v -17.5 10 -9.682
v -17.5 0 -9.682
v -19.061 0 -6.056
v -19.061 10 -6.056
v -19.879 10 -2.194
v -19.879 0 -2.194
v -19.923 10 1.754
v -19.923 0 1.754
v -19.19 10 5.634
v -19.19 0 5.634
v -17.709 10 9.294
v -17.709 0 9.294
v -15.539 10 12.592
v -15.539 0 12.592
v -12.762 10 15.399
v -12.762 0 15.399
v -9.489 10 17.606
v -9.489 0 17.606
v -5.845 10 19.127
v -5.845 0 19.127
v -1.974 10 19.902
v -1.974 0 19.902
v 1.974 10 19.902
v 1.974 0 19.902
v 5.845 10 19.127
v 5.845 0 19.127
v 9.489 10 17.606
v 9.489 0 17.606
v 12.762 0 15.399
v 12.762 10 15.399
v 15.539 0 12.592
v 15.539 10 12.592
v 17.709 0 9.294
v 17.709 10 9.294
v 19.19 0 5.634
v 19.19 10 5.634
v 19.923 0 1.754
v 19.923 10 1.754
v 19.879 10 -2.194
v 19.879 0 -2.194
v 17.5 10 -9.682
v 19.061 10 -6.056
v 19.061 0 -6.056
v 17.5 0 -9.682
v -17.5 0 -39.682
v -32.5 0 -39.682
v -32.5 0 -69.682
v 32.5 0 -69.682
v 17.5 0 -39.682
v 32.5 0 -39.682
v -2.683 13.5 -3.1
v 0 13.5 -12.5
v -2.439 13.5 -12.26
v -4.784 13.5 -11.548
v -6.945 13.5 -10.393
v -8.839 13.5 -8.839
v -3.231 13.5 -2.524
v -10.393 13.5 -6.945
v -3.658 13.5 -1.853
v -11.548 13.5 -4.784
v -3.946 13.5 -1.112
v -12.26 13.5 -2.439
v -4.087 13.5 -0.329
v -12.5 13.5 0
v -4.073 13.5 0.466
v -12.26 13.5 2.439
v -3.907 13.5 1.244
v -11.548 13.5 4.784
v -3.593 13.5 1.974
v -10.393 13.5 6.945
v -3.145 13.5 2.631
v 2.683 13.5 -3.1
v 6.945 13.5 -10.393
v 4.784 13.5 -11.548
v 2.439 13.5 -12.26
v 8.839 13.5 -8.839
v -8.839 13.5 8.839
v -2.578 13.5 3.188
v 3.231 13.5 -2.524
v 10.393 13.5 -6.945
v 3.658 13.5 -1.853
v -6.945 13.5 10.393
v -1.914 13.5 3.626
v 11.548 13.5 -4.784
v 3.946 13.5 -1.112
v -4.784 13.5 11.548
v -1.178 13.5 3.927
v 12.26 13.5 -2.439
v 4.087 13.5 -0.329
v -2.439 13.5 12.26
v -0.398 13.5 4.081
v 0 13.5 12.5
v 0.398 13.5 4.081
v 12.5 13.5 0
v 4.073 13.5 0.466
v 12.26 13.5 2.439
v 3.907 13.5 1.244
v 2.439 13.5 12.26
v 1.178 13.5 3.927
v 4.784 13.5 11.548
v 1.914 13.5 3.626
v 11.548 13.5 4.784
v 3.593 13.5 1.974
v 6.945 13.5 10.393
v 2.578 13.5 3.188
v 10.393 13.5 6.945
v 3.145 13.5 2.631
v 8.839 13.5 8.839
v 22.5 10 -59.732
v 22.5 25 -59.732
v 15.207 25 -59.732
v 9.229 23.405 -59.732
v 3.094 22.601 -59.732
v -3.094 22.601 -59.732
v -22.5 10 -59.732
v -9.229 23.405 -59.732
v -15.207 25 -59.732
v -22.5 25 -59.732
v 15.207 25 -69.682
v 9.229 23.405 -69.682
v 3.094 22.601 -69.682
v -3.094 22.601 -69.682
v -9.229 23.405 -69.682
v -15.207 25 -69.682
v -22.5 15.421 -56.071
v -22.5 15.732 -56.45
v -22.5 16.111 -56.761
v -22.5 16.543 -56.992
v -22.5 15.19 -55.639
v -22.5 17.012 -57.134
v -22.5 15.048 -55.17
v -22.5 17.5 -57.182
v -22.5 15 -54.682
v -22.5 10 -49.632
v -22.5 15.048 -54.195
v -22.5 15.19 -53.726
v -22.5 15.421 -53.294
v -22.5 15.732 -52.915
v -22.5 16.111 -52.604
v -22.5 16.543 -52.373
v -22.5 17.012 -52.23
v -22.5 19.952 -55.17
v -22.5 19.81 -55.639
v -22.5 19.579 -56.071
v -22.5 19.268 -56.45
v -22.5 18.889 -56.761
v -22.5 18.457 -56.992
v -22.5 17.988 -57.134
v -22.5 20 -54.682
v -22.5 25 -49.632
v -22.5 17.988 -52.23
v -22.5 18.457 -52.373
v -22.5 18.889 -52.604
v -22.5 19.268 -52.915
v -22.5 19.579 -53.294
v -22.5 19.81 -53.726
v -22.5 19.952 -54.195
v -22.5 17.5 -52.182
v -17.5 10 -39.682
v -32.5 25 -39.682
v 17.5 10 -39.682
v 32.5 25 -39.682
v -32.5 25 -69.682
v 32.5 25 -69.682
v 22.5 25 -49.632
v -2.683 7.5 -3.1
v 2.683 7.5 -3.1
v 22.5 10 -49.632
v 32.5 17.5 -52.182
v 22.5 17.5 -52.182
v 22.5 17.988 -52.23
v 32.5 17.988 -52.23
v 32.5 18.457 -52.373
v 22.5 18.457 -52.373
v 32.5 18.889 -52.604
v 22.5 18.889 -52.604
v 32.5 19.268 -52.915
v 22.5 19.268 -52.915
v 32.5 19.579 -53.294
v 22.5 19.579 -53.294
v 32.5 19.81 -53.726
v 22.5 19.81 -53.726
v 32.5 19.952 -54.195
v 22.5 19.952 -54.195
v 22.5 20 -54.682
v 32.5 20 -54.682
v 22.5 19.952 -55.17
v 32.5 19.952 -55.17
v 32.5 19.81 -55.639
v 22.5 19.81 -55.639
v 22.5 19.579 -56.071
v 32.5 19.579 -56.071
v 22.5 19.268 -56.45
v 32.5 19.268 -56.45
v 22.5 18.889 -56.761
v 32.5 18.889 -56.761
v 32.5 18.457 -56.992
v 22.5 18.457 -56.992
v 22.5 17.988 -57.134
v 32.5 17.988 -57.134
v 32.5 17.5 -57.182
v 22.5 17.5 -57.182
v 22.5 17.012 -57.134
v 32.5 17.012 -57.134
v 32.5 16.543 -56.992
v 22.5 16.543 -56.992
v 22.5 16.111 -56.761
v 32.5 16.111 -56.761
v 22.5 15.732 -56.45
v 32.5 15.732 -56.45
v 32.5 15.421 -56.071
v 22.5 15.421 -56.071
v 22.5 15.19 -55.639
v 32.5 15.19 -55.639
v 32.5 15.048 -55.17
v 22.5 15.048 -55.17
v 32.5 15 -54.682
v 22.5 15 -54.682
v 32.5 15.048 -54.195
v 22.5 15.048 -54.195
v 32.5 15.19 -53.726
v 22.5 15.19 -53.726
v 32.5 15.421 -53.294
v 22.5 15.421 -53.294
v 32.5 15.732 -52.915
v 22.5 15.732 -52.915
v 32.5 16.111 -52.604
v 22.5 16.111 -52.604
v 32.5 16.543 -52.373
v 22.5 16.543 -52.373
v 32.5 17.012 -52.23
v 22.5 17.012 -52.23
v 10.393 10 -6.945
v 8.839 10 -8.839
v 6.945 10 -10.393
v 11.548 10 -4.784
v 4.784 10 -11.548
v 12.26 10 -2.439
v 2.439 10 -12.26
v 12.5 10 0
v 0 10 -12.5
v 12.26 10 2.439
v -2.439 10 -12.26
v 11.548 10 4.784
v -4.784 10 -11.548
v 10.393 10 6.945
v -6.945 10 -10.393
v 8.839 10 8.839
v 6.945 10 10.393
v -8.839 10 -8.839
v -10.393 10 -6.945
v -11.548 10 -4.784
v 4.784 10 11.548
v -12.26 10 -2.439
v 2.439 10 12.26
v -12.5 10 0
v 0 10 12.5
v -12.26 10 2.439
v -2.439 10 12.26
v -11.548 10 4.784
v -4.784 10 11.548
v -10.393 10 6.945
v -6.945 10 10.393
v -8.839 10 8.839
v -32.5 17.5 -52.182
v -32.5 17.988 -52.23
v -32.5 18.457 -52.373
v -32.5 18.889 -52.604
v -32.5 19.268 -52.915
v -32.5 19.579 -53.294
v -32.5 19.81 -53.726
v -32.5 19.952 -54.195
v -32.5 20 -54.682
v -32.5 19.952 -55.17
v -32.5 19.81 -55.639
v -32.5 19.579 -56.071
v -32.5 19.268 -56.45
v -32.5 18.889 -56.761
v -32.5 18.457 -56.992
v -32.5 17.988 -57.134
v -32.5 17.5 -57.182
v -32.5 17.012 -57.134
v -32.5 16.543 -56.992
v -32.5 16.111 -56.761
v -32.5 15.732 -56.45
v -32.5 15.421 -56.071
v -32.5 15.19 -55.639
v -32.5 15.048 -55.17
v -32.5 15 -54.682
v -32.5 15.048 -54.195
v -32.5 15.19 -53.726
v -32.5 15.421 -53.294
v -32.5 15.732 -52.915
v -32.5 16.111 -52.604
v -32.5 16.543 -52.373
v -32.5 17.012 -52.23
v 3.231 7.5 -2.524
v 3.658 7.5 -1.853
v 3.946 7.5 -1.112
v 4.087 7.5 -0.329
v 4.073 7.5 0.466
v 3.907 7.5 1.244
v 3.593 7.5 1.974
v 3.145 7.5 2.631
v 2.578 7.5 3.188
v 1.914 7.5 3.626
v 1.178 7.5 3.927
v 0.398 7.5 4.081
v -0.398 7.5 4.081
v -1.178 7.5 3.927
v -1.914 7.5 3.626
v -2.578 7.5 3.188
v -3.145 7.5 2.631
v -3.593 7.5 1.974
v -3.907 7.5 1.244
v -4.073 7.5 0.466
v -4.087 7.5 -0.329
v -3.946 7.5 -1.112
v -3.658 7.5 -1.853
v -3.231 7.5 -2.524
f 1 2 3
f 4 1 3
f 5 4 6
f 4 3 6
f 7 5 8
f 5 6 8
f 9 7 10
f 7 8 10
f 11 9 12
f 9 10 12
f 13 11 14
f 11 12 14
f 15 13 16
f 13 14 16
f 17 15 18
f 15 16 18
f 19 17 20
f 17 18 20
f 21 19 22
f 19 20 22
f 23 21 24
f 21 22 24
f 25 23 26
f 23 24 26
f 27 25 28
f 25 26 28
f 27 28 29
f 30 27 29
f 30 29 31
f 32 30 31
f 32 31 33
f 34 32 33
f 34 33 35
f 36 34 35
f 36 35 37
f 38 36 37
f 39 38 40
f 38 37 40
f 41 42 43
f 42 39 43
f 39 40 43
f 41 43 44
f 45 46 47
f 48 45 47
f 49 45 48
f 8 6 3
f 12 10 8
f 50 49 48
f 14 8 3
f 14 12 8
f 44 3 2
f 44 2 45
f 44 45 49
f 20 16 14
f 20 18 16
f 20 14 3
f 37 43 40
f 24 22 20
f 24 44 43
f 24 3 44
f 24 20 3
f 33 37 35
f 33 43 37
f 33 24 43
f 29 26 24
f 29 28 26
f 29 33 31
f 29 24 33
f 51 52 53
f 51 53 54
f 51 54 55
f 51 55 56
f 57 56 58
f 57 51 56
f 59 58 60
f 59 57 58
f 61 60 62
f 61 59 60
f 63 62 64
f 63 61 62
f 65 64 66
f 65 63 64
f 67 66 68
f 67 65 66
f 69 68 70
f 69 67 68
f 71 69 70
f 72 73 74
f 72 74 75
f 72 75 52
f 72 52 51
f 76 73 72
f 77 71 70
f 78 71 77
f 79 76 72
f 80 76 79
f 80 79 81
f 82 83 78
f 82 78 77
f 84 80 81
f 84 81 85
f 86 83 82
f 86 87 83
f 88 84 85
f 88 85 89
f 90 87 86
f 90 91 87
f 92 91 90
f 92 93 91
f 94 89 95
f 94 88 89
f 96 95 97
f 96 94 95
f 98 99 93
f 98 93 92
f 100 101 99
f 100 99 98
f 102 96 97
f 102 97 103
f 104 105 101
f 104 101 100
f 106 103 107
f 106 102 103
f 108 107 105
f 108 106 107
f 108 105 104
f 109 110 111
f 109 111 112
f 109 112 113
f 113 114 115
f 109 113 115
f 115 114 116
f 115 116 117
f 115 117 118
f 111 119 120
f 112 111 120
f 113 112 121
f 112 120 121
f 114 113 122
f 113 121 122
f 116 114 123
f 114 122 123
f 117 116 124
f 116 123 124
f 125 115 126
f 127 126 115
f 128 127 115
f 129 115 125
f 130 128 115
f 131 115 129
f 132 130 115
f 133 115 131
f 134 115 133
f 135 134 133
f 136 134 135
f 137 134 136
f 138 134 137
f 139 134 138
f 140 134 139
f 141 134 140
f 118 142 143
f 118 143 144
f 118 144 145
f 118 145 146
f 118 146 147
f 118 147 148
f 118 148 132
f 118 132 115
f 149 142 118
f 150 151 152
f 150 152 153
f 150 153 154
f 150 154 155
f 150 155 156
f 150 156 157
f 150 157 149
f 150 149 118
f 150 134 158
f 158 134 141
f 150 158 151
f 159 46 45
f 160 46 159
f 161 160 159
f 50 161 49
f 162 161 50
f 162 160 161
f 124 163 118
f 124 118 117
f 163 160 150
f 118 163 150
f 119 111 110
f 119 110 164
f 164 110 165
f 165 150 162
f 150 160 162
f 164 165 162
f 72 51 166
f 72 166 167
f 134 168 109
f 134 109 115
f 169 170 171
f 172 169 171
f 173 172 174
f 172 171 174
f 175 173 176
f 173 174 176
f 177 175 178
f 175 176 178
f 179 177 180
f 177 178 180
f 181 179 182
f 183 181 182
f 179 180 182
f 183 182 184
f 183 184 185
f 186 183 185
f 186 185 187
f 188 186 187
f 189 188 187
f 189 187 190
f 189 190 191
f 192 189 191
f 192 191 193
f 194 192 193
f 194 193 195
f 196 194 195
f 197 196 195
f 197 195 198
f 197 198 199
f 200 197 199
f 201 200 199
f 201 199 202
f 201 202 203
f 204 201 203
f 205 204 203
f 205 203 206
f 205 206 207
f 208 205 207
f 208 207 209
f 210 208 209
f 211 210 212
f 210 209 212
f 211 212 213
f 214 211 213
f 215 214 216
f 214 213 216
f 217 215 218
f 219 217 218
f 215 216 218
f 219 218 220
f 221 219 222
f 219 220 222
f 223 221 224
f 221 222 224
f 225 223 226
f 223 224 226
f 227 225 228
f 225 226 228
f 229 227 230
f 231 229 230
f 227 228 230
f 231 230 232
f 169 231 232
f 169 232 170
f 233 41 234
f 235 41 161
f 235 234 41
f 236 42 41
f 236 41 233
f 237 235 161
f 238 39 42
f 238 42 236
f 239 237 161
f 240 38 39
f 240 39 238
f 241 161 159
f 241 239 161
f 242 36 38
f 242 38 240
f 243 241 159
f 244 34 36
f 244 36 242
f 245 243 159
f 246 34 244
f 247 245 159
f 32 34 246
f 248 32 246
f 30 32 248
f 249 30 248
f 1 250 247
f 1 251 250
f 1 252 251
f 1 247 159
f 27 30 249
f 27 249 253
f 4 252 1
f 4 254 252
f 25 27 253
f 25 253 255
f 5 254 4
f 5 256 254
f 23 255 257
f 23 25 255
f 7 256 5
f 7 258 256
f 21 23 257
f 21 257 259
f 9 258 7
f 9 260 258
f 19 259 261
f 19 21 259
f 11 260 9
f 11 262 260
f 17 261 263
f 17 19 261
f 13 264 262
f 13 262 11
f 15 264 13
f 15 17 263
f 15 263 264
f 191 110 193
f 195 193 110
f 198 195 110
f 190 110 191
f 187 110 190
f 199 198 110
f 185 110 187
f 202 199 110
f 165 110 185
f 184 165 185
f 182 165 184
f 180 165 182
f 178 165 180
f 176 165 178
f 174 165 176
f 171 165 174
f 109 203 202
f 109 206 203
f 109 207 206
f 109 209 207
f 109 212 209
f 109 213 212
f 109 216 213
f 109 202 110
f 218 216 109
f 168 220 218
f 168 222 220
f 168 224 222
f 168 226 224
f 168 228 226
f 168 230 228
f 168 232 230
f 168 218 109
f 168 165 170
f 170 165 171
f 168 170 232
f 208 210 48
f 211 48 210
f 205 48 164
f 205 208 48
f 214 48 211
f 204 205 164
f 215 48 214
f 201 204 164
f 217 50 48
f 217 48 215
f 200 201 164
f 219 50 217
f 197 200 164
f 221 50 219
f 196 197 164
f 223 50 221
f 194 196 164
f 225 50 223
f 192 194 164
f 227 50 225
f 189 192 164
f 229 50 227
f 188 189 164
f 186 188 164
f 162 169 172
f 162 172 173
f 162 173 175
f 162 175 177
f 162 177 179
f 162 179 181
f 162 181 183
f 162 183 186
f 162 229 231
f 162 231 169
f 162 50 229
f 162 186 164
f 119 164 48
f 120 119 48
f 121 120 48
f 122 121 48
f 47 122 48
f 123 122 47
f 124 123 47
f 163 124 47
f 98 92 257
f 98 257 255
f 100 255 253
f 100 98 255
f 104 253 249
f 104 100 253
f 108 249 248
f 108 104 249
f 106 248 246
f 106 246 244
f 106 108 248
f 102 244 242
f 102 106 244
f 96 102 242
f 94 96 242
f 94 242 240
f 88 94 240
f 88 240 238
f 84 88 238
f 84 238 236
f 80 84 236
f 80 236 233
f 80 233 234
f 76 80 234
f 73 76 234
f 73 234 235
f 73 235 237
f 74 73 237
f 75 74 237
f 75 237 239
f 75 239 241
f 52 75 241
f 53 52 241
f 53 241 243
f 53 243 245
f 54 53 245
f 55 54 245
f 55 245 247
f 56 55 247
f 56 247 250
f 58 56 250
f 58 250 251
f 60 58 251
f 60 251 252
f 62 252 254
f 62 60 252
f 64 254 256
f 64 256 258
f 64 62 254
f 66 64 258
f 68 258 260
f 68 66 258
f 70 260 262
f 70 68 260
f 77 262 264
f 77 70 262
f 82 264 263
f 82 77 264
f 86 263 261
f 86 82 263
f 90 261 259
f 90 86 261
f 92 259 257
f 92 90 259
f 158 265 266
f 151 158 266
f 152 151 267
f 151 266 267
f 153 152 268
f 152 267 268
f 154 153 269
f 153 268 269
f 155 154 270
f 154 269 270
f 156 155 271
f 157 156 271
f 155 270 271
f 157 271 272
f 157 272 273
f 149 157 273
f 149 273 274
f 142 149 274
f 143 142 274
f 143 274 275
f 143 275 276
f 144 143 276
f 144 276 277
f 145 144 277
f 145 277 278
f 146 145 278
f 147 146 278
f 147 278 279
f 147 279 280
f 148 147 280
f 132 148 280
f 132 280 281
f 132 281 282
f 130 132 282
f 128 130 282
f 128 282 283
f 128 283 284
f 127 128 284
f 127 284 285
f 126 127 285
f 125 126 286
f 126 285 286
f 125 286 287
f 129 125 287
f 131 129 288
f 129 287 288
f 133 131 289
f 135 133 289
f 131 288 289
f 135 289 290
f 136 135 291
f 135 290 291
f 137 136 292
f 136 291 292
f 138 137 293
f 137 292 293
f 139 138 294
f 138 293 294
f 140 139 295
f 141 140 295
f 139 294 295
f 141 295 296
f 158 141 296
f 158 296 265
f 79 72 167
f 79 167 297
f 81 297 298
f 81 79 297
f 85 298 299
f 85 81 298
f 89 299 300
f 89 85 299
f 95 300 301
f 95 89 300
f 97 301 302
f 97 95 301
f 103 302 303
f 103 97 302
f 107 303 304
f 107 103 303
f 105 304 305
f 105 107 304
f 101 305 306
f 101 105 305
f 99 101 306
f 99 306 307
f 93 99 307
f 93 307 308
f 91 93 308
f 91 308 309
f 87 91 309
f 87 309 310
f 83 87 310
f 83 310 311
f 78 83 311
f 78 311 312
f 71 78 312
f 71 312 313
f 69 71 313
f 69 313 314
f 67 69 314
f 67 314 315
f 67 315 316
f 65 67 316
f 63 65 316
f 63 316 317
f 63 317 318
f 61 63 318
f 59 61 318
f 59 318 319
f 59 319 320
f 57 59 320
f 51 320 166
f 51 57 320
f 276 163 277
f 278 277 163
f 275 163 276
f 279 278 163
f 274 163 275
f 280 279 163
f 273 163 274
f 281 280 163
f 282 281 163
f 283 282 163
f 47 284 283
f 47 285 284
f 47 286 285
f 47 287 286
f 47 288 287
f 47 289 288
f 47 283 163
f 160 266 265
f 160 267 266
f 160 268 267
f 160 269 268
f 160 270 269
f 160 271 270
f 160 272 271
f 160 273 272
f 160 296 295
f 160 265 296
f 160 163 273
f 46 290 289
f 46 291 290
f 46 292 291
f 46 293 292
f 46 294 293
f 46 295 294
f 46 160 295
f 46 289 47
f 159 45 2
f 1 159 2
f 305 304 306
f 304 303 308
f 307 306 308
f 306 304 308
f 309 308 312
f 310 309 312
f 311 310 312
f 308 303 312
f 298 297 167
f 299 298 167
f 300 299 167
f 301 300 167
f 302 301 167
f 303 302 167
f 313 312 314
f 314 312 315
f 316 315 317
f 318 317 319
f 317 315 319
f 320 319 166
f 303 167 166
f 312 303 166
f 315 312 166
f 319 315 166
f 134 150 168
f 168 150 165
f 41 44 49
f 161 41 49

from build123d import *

# Parameters (mm, degrees)
SKETCH1_R                = 20
BOSS_EXTRUDE1_DEPTH      = 10
CUT_EXTRUDE1_DEPTH       = 2.5
BOSS_EXTRUDE2_DEPTH      = 10
BOSS_EXTRUDE3_START      = 6
SKETCH6_R                = 12.5
BOSS_EXTRUDE3_DEPTH      = 6
BOSS_EXTRUDE4_DEPTH      = 10
BOSS_EXTRUDE4_DEPTH_BACK = 20
SKETCH8_R                = 2.5
CUT_EXTRUDE2_DEPTH       = 99.517232015
SKETCH9_R                = 12.5
CUT_EXTRUDE3_DEPTH       = 2.5
SKETCH10_W               = 45
SKETCH10_H               = 15
BOSS_EXTRUDE5_DEPTH      = 9.95
SKETCH11_W               = 45
SKETCH11_H               = 15
BOSS_EXTRUDE6_DEPTH      = 9.95
SKETCH12_R               = 47.5
CUT_EXTRUDE5_DEPTH       = 9.95


with BuildPart() as part:
    # Sketch1 → Boss-Extrude1 (new body)
    with BuildSketch(Plane(origin=(0, 0, 0), x_dir=(1, 0, 0), z_dir=(0, 1, 0))):
        with Locations(Location((0, 0, 0), (0, 0, 270))):
            Circle(SKETCH1_R)
    extrude(amount=BOSS_EXTRUDE1_DEPTH)

    # Sketch2 → Cut-Extrude1 (cut)
    with BuildSketch(Plane(origin=(0, 10, 0), x_dir=(1, 0, 0), z_dir=(0, 1, 0))):
        with BuildLine():
            Line((-2.683281573, 3.1), (2.683281573, 3.1))
            ThreePointArc((2.683281573, 3.1), (0, -4.1), (-2.683281573, 3.1))
        make_face()
    extrude(amount=-CUT_EXTRUDE1_DEPTH, mode=Mode.SUBTRACT)

    # Sketch3 → Boss-Extrude2 (add)
    with BuildSketch(Plane(origin=(0, 0, 0), x_dir=(1, 0, 0), z_dir=(0, 1, 0))):
        with BuildLine():
            Line((-17.5, 59.682458366), (-17.5, 9.682458366))
            ThreePointArc((-17.5, 9.682458366), (0, 20), (17.5, 9.682458366))
            Line((17.5, 9.682458366), (17.5, 59.682458366))
            Line((17.5, 59.682458366), (-17.5, 59.682458366))
        make_face()
    extrude(amount=BOSS_EXTRUDE2_DEPTH)

    # Sketch6 → Boss-Extrude3 (add)
    with BuildSketch(Plane(origin=(0, 10, 0), x_dir=(1, 0, 0), z_dir=(0, 1, 0)).offset(BOSS_EXTRUDE3_START)):
        with Locations(Location((0, 0, 0), (0, 0, 270))):
            Circle(SKETCH6_R)
        with BuildLine():
            Line((-2.683281573, 3.1), (2.683281573, 3.1))
            ThreePointArc((2.683281573, 3.1), (0, -4.1), (-2.683281573, 3.1))
        make_face(mode=Mode.SUBTRACT)
    extrude(amount=-BOSS_EXTRUDE3_DEPTH)

    # Sketch7 → Boss-Extrude4 (add, two sides: drawn at the far end of the back side and taken through both)
    with BuildSketch(Plane(origin=(0, 0, -59.682458366), x_dir=(-1, 0, 0), z_dir=(0, 0, -1)).offset(-BOSS_EXTRUDE4_DEPTH_BACK)):
        Polygon((-32.5, 0), (-32.5, 25), (-22.5, 25), (-22.5, 10), (22.5, 10), (22.5, 25), (32.5, 25), (32.5, 0), align=None)
    extrude(amount=BOSS_EXTRUDE4_DEPTH + BOSS_EXTRUDE4_DEPTH_BACK)

    # Sketch8 → Cut-Extrude2 (cut, through all)
    with BuildSketch(Plane.ZY.offset(32.5)):
        with Locations((-54.682458366, 17.5)):
            Circle(SKETCH8_R)
    extrude(amount=-CUT_EXTRUDE2_DEPTH, mode=Mode.SUBTRACT)

    # Sketch9 → Cut-Extrude3 (cut)
    with BuildSketch(Plane(origin=(0, 16, 0), x_dir=(1, 0, 0), z_dir=(0, 1, 0))):
        with Locations(Location((0, 0, 0), (0, 0, 270))):
            Circle(SKETCH9_R)
    extrude(amount=-CUT_EXTRUDE3_DEPTH, mode=Mode.SUBTRACT)

    # Sketch10 → Boss-Extrude5 (add)
    with BuildSketch(Plane(origin=(0, 0, -69.682458366), x_dir=(-1, 0, 0), z_dir=(0, 0, -1))):
        with Locations((0, 17.5)):
            Rectangle(SKETCH10_W, SKETCH10_H)
    extrude(amount=-BOSS_EXTRUDE5_DEPTH)

    # Sketch11 → Boss-Extrude6 (add)
    with BuildSketch(Plane.XY.offset(-39.682458366)):
        with Locations((0, 17.5)):
            Rectangle(SKETCH11_W, SKETCH11_H)
    extrude(amount=-BOSS_EXTRUDE6_DEPTH)

    # Sketch12 → Cut-Extrude5 (cut)
    with BuildSketch(Plane(origin=(0, 0, -69.682458366), x_dir=(-1, 0, 0), z_dir=(0, 0, -1))):
        with Locations((0, 70)):
            Circle(SKETCH12_R)
    extrude(amount=-CUT_EXTRUDE5_DEPTH, mode=Mode.SUBTRACT)


solid = part.part
